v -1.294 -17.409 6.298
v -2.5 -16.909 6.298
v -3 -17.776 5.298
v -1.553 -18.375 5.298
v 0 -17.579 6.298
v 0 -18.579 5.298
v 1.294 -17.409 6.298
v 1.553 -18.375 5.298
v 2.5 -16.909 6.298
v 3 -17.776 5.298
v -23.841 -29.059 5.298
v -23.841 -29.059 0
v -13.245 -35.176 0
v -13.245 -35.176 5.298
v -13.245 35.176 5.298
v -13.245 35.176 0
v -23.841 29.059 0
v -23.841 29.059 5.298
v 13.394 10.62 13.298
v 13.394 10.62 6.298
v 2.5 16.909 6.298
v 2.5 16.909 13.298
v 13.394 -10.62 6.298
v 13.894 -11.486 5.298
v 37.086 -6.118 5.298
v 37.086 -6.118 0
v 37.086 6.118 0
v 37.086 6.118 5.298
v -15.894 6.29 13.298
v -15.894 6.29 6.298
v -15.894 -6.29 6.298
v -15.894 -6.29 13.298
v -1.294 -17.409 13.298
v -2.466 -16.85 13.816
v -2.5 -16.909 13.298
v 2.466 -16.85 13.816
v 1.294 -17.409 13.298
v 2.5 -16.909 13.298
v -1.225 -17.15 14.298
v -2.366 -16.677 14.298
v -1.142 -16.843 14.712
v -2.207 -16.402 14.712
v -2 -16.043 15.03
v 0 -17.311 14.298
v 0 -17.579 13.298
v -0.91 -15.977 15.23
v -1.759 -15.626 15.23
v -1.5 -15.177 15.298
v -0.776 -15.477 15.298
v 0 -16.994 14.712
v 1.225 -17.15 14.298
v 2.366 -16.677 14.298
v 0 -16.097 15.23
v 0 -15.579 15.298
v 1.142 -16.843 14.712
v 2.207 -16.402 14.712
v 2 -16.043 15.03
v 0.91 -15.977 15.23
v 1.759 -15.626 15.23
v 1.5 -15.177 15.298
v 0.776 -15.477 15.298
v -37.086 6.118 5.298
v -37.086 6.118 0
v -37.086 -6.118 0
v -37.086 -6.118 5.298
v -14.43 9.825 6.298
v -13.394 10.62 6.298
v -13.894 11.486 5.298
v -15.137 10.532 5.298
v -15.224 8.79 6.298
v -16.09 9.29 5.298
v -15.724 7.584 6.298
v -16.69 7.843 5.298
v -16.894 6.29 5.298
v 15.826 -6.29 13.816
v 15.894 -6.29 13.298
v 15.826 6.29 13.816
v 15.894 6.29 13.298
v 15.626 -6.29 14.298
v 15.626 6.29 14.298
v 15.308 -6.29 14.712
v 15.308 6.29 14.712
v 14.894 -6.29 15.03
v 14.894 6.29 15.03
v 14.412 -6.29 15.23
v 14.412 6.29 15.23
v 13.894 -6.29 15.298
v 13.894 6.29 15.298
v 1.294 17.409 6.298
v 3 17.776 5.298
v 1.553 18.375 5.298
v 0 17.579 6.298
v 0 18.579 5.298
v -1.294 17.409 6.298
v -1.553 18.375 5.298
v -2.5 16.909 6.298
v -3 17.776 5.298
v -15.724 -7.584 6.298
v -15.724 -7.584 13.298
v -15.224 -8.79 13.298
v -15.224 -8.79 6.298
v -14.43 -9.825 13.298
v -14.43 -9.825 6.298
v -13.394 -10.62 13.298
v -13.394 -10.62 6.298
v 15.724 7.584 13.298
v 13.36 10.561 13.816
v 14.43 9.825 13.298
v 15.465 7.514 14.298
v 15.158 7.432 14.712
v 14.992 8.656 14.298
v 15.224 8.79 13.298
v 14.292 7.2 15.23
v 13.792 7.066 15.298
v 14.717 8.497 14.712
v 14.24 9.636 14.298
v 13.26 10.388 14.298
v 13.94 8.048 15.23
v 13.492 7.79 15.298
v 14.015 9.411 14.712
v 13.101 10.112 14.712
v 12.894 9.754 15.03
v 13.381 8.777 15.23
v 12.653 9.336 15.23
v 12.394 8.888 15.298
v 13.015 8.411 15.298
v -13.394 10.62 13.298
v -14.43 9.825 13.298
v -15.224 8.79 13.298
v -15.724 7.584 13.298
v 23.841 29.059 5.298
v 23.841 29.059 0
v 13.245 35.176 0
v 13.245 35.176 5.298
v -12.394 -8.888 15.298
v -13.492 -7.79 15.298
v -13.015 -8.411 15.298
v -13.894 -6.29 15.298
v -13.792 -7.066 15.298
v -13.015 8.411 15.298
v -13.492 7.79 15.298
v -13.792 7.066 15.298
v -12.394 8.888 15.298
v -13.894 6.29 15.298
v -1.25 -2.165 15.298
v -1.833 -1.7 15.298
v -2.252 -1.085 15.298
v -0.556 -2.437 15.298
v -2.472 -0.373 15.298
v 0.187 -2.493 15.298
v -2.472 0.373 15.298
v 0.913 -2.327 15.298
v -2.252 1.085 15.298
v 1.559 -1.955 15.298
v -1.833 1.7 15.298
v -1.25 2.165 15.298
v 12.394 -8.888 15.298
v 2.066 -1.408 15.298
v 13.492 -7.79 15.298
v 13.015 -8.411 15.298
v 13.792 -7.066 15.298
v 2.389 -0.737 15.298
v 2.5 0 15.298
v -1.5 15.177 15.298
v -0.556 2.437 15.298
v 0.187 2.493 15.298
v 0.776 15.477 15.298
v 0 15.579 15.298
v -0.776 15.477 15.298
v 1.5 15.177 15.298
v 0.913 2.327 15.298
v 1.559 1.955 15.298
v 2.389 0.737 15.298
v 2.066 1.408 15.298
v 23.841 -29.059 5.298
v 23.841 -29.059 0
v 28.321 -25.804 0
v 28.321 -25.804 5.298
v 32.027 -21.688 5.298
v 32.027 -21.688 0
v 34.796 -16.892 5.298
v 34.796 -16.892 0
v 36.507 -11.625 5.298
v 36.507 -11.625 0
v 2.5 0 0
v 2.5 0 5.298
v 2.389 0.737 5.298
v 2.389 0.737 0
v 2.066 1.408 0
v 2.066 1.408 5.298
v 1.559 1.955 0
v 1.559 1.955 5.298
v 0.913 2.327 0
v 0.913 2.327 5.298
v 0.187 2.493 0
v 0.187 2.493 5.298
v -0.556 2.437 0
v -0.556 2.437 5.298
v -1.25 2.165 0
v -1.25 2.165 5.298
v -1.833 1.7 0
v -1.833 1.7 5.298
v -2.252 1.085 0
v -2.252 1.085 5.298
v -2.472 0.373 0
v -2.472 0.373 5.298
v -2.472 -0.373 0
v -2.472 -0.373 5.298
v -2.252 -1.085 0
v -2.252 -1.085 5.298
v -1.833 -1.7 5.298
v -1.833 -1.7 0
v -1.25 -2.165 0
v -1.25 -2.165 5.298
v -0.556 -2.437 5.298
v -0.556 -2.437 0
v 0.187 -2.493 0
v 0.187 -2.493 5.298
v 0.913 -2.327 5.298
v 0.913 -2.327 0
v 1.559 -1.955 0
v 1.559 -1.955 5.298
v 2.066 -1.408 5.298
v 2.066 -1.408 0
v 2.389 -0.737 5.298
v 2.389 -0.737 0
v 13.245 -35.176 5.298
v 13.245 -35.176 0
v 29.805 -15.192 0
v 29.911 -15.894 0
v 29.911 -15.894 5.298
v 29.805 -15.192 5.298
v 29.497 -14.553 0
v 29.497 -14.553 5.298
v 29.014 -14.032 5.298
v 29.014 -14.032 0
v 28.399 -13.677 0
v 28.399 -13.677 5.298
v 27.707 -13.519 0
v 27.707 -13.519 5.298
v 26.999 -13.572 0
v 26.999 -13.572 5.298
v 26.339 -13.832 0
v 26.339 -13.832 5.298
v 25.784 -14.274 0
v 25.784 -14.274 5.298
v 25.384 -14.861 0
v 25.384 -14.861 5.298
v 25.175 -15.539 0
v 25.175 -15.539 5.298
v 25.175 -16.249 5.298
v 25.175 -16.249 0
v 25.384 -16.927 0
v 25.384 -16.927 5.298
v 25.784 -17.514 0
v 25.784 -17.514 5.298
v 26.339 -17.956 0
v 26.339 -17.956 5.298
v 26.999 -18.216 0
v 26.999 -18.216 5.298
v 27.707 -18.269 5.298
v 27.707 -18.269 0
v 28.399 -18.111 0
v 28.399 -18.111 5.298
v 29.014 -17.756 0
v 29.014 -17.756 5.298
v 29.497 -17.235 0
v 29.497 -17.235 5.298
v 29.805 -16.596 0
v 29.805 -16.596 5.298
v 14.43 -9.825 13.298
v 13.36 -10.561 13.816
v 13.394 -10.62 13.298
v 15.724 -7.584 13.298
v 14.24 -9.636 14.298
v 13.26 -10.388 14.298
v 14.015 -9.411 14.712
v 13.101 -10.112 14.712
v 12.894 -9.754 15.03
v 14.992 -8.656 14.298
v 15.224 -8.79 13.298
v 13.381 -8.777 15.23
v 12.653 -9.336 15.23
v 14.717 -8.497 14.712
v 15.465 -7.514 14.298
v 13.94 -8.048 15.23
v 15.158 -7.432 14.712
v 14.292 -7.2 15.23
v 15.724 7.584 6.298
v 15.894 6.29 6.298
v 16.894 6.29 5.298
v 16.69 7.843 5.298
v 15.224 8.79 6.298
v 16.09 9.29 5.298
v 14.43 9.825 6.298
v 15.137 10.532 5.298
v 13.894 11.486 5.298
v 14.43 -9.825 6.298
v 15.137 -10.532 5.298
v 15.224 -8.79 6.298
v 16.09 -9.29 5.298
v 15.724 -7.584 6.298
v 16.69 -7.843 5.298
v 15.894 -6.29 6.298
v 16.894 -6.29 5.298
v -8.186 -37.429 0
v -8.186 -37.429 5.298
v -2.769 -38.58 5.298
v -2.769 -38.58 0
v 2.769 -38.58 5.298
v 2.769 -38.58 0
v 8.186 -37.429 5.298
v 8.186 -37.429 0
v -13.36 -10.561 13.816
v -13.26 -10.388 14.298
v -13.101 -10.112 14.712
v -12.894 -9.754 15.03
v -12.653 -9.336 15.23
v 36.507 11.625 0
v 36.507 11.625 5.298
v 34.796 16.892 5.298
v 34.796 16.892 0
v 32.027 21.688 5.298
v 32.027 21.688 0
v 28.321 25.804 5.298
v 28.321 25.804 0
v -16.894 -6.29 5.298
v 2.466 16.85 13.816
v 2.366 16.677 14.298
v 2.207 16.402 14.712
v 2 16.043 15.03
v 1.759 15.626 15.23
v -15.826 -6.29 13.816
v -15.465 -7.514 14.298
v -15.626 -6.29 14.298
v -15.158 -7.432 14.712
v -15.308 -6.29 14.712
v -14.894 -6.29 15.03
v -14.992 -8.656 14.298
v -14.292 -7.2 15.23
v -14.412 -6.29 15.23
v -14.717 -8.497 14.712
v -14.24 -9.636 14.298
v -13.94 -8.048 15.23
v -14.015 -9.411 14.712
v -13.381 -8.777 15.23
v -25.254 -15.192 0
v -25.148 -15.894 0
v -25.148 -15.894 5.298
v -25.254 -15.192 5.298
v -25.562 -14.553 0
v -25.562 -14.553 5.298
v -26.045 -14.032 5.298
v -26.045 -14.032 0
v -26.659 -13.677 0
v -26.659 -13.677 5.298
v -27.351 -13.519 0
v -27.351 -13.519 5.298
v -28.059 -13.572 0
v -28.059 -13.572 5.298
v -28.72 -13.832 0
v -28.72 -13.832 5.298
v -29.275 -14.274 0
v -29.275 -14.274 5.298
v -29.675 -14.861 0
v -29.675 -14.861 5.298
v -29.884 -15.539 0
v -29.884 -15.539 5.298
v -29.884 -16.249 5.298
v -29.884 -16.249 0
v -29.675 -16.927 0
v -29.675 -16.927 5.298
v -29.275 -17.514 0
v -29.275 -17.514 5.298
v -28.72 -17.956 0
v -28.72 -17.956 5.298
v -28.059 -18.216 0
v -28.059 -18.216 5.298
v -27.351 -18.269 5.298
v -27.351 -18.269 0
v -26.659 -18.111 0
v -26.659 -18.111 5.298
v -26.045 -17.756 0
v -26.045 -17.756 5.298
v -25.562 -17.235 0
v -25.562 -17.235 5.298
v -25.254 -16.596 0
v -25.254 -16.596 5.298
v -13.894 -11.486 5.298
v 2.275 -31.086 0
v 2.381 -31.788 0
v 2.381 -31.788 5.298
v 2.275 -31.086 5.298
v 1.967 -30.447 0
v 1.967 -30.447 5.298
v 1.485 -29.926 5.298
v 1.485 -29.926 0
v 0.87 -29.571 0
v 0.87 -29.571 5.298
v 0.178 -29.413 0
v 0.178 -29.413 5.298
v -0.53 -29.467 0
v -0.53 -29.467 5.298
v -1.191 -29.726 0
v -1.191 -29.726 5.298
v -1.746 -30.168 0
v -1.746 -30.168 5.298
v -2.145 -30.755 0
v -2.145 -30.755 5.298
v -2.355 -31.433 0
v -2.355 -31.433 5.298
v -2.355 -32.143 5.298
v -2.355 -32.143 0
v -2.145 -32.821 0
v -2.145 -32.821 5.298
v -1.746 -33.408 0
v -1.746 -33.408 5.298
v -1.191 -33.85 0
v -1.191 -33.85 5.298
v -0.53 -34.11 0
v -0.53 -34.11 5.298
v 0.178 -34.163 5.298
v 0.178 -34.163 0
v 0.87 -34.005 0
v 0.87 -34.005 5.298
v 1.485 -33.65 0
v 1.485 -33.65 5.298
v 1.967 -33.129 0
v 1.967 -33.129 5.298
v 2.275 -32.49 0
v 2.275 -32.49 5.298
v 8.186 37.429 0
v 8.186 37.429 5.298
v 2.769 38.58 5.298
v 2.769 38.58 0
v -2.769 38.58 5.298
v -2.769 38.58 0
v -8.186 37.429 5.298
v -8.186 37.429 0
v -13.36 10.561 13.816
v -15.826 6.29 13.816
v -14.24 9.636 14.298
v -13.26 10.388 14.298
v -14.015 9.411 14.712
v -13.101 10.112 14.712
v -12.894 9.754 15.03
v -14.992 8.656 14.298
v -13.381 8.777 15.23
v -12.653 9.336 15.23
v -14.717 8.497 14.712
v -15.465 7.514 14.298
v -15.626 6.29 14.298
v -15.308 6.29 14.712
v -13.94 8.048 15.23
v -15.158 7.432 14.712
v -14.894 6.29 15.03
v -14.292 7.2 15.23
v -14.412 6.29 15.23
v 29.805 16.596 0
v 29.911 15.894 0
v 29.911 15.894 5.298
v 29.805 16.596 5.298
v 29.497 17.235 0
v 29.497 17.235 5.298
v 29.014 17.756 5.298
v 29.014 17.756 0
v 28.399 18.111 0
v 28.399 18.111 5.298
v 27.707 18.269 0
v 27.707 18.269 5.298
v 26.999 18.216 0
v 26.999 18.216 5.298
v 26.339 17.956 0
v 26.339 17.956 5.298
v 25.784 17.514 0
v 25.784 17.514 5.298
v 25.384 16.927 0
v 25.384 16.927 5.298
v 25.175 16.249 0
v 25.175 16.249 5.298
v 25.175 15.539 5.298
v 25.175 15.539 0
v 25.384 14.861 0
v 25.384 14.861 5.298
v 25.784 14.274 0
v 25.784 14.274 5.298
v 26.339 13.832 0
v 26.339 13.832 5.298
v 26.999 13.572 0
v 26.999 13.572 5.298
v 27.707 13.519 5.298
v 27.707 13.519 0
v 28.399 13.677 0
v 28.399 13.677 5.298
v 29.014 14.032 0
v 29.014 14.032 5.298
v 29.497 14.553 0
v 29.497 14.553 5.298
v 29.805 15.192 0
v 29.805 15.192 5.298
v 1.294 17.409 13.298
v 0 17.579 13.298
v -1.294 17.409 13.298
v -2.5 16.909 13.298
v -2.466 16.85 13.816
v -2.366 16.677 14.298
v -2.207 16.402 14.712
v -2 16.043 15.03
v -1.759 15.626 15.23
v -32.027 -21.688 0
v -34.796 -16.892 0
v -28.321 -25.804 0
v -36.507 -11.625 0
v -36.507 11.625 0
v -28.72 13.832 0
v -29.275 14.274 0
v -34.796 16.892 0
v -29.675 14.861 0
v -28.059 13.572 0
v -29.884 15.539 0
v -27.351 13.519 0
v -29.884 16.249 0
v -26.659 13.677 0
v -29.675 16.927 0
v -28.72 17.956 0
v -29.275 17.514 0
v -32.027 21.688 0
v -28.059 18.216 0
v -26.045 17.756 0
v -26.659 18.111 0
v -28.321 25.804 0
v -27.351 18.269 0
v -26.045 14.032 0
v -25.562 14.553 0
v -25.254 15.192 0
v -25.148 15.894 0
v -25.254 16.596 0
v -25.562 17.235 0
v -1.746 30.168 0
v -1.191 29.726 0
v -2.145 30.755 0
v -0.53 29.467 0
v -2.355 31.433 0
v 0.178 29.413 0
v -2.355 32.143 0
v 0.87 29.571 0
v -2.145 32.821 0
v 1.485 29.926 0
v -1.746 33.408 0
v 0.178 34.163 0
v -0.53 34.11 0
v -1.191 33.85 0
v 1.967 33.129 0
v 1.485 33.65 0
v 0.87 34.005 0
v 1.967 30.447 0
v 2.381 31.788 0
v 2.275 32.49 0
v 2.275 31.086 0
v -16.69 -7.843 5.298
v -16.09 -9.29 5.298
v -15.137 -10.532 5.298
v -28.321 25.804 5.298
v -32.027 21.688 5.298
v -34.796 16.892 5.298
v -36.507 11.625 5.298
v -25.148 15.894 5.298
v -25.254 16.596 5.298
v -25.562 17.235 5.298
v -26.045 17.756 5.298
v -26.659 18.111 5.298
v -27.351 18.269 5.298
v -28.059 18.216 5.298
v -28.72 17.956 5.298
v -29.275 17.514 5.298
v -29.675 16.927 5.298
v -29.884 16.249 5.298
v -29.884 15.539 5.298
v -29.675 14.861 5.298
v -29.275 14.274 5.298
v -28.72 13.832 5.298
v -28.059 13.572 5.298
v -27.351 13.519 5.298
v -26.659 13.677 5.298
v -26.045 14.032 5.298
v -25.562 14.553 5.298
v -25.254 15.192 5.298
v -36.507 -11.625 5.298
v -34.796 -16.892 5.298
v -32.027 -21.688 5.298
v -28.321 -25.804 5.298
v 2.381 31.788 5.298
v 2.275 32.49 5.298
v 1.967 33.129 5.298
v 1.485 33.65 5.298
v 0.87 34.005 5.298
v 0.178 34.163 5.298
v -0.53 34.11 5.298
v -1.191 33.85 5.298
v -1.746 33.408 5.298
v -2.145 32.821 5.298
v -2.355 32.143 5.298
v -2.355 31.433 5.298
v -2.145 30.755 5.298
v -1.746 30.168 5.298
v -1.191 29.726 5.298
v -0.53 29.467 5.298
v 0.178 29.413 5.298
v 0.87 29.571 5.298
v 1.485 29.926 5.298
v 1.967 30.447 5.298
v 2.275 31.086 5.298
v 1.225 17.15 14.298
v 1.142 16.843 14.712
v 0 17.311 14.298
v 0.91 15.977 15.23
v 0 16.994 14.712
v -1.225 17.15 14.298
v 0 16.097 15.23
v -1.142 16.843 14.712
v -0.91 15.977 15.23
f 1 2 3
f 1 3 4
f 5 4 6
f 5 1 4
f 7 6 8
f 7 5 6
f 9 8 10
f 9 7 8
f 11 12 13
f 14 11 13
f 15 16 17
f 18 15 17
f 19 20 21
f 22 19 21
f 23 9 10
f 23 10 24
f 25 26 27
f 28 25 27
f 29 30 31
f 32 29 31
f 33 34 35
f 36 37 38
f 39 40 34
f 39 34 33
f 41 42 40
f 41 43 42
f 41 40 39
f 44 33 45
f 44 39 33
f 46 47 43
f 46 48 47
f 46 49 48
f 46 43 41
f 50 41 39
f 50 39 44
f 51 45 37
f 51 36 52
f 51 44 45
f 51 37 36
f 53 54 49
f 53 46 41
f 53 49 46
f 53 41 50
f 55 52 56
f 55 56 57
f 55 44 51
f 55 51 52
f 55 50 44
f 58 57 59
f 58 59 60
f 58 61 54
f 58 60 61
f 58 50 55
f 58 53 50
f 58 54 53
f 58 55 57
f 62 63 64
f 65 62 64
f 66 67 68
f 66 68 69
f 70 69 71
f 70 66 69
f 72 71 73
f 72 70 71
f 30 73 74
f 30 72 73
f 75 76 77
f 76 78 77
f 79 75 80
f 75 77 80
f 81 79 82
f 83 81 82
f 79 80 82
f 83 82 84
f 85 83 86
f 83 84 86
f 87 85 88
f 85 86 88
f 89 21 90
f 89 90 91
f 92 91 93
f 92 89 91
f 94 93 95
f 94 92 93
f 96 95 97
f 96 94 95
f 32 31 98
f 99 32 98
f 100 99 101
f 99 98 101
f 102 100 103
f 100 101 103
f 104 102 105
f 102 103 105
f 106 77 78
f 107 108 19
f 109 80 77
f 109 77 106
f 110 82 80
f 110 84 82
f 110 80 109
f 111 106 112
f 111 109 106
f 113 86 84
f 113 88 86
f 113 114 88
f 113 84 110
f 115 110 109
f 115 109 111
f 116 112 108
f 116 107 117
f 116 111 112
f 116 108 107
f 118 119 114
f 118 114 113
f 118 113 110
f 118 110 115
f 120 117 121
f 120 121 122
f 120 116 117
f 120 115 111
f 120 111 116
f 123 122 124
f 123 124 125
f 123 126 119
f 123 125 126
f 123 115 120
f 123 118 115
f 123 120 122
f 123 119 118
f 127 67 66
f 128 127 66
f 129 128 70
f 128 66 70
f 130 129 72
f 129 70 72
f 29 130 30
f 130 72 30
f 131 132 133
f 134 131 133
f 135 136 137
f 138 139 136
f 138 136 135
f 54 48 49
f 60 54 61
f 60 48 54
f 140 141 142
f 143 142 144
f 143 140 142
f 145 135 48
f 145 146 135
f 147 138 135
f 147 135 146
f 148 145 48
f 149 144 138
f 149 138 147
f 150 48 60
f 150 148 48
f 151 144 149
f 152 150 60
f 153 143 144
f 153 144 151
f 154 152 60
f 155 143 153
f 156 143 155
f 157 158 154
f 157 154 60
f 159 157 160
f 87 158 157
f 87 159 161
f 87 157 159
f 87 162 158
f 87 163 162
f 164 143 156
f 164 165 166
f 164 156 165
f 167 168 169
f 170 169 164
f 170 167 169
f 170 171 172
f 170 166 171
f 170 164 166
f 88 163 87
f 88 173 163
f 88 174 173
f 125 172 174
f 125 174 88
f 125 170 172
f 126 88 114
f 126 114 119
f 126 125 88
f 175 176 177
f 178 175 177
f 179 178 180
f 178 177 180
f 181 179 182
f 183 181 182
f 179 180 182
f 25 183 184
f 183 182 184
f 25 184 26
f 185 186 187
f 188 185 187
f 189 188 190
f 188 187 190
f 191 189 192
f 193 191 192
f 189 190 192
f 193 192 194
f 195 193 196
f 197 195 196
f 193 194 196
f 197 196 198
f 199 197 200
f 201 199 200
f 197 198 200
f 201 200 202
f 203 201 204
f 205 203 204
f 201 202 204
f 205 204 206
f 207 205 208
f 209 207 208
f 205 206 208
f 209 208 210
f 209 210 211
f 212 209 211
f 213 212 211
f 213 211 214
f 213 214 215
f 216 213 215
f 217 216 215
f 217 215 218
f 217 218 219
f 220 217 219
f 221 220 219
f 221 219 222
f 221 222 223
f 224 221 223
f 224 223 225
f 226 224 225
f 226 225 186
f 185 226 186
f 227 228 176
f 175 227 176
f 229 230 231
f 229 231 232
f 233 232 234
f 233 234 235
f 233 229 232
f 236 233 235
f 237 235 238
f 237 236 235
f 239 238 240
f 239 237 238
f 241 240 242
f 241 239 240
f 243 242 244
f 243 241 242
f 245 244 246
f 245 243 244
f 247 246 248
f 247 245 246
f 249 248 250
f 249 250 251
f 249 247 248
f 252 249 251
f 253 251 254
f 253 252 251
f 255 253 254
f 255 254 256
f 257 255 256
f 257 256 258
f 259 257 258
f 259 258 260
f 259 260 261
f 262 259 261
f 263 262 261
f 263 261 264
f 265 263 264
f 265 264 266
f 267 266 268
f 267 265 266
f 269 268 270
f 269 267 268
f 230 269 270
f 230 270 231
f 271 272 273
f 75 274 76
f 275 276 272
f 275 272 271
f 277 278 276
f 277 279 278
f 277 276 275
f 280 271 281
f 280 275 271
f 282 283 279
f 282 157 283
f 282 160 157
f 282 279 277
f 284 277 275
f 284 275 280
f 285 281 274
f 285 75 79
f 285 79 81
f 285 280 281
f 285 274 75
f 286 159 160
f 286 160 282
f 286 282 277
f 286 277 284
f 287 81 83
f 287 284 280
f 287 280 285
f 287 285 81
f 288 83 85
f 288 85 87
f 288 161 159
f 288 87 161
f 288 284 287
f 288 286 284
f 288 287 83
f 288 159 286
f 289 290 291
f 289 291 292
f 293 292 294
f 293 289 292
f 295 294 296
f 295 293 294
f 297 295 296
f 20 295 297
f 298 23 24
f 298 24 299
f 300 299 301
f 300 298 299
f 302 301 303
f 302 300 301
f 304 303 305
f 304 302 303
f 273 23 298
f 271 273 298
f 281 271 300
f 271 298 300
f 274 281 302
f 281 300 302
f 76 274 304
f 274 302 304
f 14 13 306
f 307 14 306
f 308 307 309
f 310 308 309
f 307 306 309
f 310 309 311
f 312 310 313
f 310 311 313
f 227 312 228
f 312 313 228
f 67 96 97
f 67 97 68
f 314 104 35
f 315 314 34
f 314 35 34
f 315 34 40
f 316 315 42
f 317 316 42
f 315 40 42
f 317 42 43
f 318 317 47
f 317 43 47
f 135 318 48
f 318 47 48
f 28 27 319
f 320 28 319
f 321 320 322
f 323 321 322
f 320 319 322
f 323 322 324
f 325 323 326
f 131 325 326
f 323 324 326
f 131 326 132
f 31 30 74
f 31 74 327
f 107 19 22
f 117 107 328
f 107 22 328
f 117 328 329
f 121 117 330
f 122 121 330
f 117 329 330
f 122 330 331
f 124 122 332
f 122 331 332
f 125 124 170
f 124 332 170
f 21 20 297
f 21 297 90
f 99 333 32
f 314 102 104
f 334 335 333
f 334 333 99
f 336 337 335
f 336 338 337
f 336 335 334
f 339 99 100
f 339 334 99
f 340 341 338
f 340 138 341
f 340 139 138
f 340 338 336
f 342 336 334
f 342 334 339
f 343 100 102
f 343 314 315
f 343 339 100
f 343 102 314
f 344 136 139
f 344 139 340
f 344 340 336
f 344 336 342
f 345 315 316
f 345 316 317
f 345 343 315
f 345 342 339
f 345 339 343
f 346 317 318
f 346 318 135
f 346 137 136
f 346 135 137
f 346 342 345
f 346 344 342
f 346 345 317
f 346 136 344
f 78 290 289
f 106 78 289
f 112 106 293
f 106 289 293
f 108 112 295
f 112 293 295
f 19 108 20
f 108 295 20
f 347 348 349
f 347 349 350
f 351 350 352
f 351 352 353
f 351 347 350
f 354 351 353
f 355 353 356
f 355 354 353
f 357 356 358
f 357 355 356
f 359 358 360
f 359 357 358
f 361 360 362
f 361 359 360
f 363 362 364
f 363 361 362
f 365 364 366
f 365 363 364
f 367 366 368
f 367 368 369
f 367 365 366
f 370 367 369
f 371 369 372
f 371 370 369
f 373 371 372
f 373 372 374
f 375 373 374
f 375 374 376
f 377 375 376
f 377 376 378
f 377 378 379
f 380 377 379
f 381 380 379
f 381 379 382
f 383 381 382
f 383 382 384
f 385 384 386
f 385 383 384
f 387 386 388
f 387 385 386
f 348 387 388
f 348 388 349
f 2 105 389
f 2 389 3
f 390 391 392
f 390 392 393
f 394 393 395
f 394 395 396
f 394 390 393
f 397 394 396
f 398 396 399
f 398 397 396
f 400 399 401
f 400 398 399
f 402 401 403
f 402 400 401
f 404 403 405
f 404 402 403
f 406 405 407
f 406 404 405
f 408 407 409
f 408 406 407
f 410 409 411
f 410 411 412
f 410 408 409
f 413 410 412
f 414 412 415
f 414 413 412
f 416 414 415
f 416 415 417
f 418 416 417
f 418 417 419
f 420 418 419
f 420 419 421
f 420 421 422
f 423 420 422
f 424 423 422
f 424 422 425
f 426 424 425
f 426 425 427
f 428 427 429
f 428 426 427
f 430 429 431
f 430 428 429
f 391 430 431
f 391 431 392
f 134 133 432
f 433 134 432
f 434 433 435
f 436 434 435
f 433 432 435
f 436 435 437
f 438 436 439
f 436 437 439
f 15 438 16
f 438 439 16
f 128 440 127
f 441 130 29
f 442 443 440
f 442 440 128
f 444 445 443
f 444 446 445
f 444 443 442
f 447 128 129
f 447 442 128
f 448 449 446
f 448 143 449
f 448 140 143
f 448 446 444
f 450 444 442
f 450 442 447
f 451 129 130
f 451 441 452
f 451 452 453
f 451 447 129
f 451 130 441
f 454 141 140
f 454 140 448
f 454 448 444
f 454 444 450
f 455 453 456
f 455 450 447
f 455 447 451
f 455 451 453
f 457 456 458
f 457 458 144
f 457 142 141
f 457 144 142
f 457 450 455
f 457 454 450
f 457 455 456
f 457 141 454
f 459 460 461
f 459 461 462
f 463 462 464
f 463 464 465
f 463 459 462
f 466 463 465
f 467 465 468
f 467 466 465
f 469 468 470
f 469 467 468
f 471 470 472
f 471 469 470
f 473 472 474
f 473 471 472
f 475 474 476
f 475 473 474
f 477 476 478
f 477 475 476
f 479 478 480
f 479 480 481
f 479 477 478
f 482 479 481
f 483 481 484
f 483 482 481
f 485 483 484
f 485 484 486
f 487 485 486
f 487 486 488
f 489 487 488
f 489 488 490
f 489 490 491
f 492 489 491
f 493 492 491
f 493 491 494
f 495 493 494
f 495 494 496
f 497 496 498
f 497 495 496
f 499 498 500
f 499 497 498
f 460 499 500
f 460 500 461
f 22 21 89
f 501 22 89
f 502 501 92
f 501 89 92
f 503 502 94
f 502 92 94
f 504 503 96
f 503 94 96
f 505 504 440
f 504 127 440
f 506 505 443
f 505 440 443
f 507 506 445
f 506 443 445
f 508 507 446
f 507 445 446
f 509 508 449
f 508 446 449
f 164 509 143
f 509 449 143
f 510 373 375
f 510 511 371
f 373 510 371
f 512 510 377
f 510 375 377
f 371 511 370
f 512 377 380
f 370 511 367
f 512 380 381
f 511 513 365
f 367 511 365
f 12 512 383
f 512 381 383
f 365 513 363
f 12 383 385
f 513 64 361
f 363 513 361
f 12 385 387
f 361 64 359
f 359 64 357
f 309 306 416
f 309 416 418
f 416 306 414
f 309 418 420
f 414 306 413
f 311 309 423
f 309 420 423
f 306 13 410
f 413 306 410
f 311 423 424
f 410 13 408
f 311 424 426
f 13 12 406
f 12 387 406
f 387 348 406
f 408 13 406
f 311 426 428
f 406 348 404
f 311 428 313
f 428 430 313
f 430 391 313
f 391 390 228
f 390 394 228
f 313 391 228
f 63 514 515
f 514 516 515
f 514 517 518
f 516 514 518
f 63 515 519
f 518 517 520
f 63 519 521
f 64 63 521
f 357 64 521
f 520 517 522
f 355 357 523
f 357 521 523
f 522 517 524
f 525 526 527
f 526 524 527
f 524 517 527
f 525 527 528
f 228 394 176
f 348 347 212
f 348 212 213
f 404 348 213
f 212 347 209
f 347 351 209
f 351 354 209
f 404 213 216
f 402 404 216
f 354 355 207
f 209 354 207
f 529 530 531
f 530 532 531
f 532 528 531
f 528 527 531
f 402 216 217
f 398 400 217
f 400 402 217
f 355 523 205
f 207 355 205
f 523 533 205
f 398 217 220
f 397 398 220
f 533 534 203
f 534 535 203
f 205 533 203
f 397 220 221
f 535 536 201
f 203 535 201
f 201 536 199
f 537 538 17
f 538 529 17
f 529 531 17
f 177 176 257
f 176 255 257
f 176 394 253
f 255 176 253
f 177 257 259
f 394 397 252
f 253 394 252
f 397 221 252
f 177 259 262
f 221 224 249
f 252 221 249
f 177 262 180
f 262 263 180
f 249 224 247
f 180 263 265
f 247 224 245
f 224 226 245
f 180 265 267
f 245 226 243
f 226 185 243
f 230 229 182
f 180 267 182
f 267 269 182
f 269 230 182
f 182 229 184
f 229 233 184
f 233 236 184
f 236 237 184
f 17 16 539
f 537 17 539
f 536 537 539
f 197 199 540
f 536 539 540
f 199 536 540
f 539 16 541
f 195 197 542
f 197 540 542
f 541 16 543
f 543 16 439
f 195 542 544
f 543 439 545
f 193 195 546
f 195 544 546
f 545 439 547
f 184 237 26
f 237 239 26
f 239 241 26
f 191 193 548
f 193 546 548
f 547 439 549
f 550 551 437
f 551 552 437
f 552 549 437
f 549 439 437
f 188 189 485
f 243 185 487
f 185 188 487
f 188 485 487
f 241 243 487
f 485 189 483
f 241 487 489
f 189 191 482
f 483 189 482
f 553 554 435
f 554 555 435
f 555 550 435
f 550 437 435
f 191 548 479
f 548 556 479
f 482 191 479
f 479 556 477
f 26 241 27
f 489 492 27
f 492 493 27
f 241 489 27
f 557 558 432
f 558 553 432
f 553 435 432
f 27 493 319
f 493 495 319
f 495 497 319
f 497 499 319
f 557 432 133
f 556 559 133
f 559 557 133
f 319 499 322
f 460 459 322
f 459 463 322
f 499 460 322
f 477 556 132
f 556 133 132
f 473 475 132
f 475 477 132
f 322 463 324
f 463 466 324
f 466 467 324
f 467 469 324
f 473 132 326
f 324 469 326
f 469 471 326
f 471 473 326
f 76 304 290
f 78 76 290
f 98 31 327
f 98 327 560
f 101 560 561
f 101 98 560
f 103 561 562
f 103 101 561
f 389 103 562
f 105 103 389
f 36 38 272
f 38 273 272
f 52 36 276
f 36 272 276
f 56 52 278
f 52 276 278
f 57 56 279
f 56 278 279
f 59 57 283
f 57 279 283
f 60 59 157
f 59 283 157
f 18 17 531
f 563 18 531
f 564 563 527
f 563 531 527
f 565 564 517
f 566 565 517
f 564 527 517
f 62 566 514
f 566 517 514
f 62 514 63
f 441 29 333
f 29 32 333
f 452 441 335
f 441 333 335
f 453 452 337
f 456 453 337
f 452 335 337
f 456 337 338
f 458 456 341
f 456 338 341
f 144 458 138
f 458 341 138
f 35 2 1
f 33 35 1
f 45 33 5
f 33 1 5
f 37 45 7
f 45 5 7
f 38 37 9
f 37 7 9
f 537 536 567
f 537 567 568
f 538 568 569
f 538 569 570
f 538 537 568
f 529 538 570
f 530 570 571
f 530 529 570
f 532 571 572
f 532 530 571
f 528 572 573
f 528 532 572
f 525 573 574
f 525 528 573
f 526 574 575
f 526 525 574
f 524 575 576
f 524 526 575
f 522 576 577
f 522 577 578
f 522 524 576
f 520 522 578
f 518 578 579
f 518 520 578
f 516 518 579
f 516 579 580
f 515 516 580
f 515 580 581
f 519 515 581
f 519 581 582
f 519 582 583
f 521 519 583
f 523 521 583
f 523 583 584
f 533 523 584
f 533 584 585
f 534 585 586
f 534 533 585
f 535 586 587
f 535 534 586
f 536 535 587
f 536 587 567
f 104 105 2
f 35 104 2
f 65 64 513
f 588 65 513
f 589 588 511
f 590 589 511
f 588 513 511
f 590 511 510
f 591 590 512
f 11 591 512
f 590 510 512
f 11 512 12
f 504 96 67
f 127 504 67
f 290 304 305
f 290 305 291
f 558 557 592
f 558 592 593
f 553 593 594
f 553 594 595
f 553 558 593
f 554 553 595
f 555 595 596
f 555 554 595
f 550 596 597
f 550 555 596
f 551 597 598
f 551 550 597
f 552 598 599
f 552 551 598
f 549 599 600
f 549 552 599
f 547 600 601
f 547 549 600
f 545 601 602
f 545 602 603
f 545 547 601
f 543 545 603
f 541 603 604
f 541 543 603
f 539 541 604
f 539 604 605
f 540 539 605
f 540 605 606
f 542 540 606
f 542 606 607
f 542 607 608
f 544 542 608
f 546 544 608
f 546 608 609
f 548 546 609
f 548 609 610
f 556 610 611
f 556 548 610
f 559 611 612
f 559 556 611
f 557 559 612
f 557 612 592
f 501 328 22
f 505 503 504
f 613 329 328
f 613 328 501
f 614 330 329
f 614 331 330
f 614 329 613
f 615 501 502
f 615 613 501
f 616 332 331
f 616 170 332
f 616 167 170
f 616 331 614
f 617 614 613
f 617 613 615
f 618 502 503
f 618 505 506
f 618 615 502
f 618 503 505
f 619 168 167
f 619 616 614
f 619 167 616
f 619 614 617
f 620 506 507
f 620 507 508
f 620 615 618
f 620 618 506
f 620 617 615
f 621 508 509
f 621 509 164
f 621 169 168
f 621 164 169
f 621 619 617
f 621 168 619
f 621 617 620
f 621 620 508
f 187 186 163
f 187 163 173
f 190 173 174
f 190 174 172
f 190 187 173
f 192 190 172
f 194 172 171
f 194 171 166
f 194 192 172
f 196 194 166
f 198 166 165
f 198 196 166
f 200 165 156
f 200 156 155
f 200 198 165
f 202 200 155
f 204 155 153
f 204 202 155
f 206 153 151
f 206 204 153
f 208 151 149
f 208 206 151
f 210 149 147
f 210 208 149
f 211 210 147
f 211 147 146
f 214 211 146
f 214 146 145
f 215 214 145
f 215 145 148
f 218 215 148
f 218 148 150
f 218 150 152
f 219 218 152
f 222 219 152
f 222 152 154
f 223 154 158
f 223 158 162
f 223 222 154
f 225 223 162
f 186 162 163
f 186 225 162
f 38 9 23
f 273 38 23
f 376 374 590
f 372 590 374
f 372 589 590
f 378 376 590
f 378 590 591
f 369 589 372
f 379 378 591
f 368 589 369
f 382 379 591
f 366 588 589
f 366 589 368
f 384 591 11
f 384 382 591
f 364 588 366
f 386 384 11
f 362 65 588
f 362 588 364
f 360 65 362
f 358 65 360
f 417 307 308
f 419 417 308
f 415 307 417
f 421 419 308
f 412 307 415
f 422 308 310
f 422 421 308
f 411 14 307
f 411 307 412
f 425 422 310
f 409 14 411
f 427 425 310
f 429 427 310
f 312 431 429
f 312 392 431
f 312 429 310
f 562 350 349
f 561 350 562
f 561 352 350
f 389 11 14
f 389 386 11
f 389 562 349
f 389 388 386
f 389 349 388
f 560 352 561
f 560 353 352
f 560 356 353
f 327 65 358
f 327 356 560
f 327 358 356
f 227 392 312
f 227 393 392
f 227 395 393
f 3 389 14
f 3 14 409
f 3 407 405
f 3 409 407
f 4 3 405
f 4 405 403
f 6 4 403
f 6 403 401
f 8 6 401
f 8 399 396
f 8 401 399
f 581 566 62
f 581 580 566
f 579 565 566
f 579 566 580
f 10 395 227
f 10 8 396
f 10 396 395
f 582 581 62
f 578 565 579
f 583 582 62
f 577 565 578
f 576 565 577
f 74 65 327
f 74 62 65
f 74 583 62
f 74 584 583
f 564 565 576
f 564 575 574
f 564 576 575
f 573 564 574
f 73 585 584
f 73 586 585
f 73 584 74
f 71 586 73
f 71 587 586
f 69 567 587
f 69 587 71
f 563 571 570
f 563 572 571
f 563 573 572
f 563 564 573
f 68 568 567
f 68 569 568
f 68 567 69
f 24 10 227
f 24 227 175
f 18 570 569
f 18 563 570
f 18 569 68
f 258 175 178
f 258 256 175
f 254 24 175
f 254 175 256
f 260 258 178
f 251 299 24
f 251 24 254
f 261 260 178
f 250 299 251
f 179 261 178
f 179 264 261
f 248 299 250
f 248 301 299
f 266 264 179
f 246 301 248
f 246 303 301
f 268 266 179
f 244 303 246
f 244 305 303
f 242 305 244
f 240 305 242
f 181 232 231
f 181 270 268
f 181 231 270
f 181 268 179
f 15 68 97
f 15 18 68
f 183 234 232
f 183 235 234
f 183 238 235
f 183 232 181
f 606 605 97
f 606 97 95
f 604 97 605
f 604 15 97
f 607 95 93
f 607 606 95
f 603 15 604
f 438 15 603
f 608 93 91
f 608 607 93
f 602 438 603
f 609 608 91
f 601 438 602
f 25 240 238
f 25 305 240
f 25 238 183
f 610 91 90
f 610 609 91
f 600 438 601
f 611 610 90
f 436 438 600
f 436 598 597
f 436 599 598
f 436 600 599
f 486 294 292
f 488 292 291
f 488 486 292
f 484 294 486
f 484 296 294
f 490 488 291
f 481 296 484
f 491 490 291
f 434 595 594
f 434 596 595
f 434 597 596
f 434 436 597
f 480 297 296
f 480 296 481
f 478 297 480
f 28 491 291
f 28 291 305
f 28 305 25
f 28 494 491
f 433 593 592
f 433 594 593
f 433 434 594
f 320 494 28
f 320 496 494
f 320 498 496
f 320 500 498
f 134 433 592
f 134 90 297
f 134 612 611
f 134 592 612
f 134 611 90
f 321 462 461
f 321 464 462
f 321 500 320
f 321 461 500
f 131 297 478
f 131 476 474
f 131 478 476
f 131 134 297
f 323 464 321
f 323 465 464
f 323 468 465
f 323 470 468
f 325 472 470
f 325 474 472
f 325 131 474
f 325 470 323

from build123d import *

# Parameters (mm, degrees)
SKETCH1_R             = 2.38125
BOSS_EXTRUDE1_DEPTH   = 5.298013245
SKETCH3_R             = 2.5
BOSS_EXTRUDE4_DEPTH   = 10
CHAMFER2_SIZE         = 1
FILLET1_R             = 2
CROQUIS1_R            = 2.5
CORTAR_EXTRUIR1_DEPTH = 10


with BuildPart() as part:
    # Sketch1 → Boss-Extrude1 (new body)
    with BuildSketch(Plane.XY):
        with BuildLine():
            Line((-13.245033113, 35.176307792), (-23.841059603, 29.058689045))
            ThreePointArc((-23.841059603, 29.058689045), (-33.537096789, 19.362651859), (-37.086092715, 6.117618746))
            Line((-37.086092715, 6.117618746), (-37.086092715, -6.117618746))
            ThreePointArc((-37.086092715, -6.117618746), (-33.537096789, -19.362651859), (-23.841059603, -29.058689045))
            Line((-23.841059603, -29.058689045), (-13.245033113, -35.176307792))
            ThreePointArc((-13.245033113, -35.176307792), (0, -38.725303718), (13.245033113, -35.176307792))
            Line((13.245033113, -35.176307792), (23.841059603, -29.058689045))
            ThreePointArc((23.841059603, -29.058689045), (33.537096789, -19.362651859), (37.086092715, -6.117618746))
            Line((37.086092715, -6.117618746), (37.086092715, 6.117618746))
            ThreePointArc((37.086092715, 6.117618746), (33.537096789, 19.362651859), (23.841059603, 29.058689045))
            Line((23.841059603, 29.058689045), (13.245033113, 35.176307792))
            ThreePointArc((13.245033113, 35.176307792), (0, 38.725303718), (-13.245033113, 35.176307792))
        make_face()
        with Locations((0, 31.78807947)):
            Circle(SKETCH1_R, mode=Mode.SUBTRACT)
        with Locations((27.529284359, 15.894039735)):
            Circle(SKETCH1_R, mode=Mode.SUBTRACT)
        with Locations((27.529284359, -15.894039735)):
            Circle(SKETCH1_R, mode=Mode.SUBTRACT)
        with Locations((0, -31.78807947)):
            Circle(SKETCH1_R, mode=Mode.SUBTRACT)
        with Locations((-27.529284359, -15.894039735)):
            Circle(SKETCH1_R, mode=Mode.SUBTRACT)
        with Locations((-27.529284359, 15.894039735)):
            Circle(SKETCH1_R, mode=Mode.SUBTRACT)
    extrude(amount=BOSS_EXTRUDE1_DEPTH)

    # Sketch3 → Boss-Extrude4 (add)
    with BuildSketch(Plane.XY.offset(5.298013245)):
        with BuildLine():
            Line((-2.5, 16.909480566), (-13.394039735, 10.619803793))
            ThreePointArc((-13.394039735, 10.619803793), (-15.224166754, 8.789676774), (-15.894039735, 6.289676774))
            Line((-15.894039735, 6.289676774), (-15.894039735, -6.289676774))
            ThreePointArc((-15.894039735, -6.289676774), (-15.224166754, -8.789676774), (-13.394039735, -10.619803793))
            Line((-13.394039735, -10.619803793), (-2.5, -16.909480566))
            ThreePointArc((-2.5, -16.909480566), (0, -17.579353547), (2.5, -16.909480566))
            Line((2.5, -16.909480566), (13.394039735, -10.619803793))
            ThreePointArc((13.394039735, -10.619803793), (15.224166754, -8.789676774), (15.894039735, -6.289676774))
            Line((15.894039735, -6.289676774), (15.894039735, 6.289676774))
            ThreePointArc((15.894039735, 6.289676774), (15.224166754, 8.789676774), (13.394039735, 10.619803793))
            Line((13.394039735, 10.619803793), (2.5, 16.909480566))
            ThreePointArc((2.5, 16.909480566), (0, 17.579353547), (-2.5, 16.909480566))
        make_face()
        Circle(SKETCH3_R, mode=Mode.SUBTRACT)
    extrude(amount=BOSS_EXTRUDE4_DEPTH)

    # Chamfer2
    chamfer2_edges = [part.edges().sort_by_distance(p)[0] for p in [
        (15.224166754, 8.789676774, 5.298013245),
        (7.947019868, 13.764642179, 5.298013245),
        (0, 17.579353547, 5.298013245),
        (-7.947019868, 13.764642179, 5.298013245),
        (-15.224166754, 8.789676774, 5.298013245),
        (-15.894039735, 0, 5.298013245),
        (-15.224166754, -8.789676774, 5.298013245),
        (-7.947019868, -13.764642179, 5.298013245),
        (0, -17.579353547, 5.298013245),
        (7.947019868, -13.764642179, 5.298013245),
        (15.224166754, -8.789676774, 5.298013245),
        (15.894039735, 0, 5.298013245),
    ]]
    chamfer(chamfer2_edges, length=CHAMFER2_SIZE)

    # Fillet1
    fillet1_edges = [part.edges().sort_by_distance(p)[0] for p in [
        (15.224166754, 8.789676774, 15.298013245),
        (7.947019868, 13.764642179, 15.298013245),
        (0, 17.579353547, 15.298013245),
        (-7.947019868, 13.764642179, 15.298013245),
        (-15.224166754, 8.789676774, 15.298013245),
        (-15.894039735, 0, 15.298013245),
        (-15.224166754, -8.789676774, 15.298013245),
        (-7.947019868, -13.764642179, 15.298013245),
        (0, -17.579353547, 15.298013245),
        (7.947019868, -13.764642179, 15.298013245),
        (15.224166754, -8.789676774, 15.298013245),
        (15.894039735, 0, 15.298013245),
    ]]
    fillet(fillet1_edges, radius=FILLET1_R)

    # Croquis1 → Cortar-Extruir1 (cut)
    with BuildSketch(Plane.XY.offset(5.298013245)):
        Circle(CROQUIS1_R)
    extrude(amount=-CORTAR_EXTRUIR1_DEPTH, mode=Mode.SUBTRACT)


solid = part.part
